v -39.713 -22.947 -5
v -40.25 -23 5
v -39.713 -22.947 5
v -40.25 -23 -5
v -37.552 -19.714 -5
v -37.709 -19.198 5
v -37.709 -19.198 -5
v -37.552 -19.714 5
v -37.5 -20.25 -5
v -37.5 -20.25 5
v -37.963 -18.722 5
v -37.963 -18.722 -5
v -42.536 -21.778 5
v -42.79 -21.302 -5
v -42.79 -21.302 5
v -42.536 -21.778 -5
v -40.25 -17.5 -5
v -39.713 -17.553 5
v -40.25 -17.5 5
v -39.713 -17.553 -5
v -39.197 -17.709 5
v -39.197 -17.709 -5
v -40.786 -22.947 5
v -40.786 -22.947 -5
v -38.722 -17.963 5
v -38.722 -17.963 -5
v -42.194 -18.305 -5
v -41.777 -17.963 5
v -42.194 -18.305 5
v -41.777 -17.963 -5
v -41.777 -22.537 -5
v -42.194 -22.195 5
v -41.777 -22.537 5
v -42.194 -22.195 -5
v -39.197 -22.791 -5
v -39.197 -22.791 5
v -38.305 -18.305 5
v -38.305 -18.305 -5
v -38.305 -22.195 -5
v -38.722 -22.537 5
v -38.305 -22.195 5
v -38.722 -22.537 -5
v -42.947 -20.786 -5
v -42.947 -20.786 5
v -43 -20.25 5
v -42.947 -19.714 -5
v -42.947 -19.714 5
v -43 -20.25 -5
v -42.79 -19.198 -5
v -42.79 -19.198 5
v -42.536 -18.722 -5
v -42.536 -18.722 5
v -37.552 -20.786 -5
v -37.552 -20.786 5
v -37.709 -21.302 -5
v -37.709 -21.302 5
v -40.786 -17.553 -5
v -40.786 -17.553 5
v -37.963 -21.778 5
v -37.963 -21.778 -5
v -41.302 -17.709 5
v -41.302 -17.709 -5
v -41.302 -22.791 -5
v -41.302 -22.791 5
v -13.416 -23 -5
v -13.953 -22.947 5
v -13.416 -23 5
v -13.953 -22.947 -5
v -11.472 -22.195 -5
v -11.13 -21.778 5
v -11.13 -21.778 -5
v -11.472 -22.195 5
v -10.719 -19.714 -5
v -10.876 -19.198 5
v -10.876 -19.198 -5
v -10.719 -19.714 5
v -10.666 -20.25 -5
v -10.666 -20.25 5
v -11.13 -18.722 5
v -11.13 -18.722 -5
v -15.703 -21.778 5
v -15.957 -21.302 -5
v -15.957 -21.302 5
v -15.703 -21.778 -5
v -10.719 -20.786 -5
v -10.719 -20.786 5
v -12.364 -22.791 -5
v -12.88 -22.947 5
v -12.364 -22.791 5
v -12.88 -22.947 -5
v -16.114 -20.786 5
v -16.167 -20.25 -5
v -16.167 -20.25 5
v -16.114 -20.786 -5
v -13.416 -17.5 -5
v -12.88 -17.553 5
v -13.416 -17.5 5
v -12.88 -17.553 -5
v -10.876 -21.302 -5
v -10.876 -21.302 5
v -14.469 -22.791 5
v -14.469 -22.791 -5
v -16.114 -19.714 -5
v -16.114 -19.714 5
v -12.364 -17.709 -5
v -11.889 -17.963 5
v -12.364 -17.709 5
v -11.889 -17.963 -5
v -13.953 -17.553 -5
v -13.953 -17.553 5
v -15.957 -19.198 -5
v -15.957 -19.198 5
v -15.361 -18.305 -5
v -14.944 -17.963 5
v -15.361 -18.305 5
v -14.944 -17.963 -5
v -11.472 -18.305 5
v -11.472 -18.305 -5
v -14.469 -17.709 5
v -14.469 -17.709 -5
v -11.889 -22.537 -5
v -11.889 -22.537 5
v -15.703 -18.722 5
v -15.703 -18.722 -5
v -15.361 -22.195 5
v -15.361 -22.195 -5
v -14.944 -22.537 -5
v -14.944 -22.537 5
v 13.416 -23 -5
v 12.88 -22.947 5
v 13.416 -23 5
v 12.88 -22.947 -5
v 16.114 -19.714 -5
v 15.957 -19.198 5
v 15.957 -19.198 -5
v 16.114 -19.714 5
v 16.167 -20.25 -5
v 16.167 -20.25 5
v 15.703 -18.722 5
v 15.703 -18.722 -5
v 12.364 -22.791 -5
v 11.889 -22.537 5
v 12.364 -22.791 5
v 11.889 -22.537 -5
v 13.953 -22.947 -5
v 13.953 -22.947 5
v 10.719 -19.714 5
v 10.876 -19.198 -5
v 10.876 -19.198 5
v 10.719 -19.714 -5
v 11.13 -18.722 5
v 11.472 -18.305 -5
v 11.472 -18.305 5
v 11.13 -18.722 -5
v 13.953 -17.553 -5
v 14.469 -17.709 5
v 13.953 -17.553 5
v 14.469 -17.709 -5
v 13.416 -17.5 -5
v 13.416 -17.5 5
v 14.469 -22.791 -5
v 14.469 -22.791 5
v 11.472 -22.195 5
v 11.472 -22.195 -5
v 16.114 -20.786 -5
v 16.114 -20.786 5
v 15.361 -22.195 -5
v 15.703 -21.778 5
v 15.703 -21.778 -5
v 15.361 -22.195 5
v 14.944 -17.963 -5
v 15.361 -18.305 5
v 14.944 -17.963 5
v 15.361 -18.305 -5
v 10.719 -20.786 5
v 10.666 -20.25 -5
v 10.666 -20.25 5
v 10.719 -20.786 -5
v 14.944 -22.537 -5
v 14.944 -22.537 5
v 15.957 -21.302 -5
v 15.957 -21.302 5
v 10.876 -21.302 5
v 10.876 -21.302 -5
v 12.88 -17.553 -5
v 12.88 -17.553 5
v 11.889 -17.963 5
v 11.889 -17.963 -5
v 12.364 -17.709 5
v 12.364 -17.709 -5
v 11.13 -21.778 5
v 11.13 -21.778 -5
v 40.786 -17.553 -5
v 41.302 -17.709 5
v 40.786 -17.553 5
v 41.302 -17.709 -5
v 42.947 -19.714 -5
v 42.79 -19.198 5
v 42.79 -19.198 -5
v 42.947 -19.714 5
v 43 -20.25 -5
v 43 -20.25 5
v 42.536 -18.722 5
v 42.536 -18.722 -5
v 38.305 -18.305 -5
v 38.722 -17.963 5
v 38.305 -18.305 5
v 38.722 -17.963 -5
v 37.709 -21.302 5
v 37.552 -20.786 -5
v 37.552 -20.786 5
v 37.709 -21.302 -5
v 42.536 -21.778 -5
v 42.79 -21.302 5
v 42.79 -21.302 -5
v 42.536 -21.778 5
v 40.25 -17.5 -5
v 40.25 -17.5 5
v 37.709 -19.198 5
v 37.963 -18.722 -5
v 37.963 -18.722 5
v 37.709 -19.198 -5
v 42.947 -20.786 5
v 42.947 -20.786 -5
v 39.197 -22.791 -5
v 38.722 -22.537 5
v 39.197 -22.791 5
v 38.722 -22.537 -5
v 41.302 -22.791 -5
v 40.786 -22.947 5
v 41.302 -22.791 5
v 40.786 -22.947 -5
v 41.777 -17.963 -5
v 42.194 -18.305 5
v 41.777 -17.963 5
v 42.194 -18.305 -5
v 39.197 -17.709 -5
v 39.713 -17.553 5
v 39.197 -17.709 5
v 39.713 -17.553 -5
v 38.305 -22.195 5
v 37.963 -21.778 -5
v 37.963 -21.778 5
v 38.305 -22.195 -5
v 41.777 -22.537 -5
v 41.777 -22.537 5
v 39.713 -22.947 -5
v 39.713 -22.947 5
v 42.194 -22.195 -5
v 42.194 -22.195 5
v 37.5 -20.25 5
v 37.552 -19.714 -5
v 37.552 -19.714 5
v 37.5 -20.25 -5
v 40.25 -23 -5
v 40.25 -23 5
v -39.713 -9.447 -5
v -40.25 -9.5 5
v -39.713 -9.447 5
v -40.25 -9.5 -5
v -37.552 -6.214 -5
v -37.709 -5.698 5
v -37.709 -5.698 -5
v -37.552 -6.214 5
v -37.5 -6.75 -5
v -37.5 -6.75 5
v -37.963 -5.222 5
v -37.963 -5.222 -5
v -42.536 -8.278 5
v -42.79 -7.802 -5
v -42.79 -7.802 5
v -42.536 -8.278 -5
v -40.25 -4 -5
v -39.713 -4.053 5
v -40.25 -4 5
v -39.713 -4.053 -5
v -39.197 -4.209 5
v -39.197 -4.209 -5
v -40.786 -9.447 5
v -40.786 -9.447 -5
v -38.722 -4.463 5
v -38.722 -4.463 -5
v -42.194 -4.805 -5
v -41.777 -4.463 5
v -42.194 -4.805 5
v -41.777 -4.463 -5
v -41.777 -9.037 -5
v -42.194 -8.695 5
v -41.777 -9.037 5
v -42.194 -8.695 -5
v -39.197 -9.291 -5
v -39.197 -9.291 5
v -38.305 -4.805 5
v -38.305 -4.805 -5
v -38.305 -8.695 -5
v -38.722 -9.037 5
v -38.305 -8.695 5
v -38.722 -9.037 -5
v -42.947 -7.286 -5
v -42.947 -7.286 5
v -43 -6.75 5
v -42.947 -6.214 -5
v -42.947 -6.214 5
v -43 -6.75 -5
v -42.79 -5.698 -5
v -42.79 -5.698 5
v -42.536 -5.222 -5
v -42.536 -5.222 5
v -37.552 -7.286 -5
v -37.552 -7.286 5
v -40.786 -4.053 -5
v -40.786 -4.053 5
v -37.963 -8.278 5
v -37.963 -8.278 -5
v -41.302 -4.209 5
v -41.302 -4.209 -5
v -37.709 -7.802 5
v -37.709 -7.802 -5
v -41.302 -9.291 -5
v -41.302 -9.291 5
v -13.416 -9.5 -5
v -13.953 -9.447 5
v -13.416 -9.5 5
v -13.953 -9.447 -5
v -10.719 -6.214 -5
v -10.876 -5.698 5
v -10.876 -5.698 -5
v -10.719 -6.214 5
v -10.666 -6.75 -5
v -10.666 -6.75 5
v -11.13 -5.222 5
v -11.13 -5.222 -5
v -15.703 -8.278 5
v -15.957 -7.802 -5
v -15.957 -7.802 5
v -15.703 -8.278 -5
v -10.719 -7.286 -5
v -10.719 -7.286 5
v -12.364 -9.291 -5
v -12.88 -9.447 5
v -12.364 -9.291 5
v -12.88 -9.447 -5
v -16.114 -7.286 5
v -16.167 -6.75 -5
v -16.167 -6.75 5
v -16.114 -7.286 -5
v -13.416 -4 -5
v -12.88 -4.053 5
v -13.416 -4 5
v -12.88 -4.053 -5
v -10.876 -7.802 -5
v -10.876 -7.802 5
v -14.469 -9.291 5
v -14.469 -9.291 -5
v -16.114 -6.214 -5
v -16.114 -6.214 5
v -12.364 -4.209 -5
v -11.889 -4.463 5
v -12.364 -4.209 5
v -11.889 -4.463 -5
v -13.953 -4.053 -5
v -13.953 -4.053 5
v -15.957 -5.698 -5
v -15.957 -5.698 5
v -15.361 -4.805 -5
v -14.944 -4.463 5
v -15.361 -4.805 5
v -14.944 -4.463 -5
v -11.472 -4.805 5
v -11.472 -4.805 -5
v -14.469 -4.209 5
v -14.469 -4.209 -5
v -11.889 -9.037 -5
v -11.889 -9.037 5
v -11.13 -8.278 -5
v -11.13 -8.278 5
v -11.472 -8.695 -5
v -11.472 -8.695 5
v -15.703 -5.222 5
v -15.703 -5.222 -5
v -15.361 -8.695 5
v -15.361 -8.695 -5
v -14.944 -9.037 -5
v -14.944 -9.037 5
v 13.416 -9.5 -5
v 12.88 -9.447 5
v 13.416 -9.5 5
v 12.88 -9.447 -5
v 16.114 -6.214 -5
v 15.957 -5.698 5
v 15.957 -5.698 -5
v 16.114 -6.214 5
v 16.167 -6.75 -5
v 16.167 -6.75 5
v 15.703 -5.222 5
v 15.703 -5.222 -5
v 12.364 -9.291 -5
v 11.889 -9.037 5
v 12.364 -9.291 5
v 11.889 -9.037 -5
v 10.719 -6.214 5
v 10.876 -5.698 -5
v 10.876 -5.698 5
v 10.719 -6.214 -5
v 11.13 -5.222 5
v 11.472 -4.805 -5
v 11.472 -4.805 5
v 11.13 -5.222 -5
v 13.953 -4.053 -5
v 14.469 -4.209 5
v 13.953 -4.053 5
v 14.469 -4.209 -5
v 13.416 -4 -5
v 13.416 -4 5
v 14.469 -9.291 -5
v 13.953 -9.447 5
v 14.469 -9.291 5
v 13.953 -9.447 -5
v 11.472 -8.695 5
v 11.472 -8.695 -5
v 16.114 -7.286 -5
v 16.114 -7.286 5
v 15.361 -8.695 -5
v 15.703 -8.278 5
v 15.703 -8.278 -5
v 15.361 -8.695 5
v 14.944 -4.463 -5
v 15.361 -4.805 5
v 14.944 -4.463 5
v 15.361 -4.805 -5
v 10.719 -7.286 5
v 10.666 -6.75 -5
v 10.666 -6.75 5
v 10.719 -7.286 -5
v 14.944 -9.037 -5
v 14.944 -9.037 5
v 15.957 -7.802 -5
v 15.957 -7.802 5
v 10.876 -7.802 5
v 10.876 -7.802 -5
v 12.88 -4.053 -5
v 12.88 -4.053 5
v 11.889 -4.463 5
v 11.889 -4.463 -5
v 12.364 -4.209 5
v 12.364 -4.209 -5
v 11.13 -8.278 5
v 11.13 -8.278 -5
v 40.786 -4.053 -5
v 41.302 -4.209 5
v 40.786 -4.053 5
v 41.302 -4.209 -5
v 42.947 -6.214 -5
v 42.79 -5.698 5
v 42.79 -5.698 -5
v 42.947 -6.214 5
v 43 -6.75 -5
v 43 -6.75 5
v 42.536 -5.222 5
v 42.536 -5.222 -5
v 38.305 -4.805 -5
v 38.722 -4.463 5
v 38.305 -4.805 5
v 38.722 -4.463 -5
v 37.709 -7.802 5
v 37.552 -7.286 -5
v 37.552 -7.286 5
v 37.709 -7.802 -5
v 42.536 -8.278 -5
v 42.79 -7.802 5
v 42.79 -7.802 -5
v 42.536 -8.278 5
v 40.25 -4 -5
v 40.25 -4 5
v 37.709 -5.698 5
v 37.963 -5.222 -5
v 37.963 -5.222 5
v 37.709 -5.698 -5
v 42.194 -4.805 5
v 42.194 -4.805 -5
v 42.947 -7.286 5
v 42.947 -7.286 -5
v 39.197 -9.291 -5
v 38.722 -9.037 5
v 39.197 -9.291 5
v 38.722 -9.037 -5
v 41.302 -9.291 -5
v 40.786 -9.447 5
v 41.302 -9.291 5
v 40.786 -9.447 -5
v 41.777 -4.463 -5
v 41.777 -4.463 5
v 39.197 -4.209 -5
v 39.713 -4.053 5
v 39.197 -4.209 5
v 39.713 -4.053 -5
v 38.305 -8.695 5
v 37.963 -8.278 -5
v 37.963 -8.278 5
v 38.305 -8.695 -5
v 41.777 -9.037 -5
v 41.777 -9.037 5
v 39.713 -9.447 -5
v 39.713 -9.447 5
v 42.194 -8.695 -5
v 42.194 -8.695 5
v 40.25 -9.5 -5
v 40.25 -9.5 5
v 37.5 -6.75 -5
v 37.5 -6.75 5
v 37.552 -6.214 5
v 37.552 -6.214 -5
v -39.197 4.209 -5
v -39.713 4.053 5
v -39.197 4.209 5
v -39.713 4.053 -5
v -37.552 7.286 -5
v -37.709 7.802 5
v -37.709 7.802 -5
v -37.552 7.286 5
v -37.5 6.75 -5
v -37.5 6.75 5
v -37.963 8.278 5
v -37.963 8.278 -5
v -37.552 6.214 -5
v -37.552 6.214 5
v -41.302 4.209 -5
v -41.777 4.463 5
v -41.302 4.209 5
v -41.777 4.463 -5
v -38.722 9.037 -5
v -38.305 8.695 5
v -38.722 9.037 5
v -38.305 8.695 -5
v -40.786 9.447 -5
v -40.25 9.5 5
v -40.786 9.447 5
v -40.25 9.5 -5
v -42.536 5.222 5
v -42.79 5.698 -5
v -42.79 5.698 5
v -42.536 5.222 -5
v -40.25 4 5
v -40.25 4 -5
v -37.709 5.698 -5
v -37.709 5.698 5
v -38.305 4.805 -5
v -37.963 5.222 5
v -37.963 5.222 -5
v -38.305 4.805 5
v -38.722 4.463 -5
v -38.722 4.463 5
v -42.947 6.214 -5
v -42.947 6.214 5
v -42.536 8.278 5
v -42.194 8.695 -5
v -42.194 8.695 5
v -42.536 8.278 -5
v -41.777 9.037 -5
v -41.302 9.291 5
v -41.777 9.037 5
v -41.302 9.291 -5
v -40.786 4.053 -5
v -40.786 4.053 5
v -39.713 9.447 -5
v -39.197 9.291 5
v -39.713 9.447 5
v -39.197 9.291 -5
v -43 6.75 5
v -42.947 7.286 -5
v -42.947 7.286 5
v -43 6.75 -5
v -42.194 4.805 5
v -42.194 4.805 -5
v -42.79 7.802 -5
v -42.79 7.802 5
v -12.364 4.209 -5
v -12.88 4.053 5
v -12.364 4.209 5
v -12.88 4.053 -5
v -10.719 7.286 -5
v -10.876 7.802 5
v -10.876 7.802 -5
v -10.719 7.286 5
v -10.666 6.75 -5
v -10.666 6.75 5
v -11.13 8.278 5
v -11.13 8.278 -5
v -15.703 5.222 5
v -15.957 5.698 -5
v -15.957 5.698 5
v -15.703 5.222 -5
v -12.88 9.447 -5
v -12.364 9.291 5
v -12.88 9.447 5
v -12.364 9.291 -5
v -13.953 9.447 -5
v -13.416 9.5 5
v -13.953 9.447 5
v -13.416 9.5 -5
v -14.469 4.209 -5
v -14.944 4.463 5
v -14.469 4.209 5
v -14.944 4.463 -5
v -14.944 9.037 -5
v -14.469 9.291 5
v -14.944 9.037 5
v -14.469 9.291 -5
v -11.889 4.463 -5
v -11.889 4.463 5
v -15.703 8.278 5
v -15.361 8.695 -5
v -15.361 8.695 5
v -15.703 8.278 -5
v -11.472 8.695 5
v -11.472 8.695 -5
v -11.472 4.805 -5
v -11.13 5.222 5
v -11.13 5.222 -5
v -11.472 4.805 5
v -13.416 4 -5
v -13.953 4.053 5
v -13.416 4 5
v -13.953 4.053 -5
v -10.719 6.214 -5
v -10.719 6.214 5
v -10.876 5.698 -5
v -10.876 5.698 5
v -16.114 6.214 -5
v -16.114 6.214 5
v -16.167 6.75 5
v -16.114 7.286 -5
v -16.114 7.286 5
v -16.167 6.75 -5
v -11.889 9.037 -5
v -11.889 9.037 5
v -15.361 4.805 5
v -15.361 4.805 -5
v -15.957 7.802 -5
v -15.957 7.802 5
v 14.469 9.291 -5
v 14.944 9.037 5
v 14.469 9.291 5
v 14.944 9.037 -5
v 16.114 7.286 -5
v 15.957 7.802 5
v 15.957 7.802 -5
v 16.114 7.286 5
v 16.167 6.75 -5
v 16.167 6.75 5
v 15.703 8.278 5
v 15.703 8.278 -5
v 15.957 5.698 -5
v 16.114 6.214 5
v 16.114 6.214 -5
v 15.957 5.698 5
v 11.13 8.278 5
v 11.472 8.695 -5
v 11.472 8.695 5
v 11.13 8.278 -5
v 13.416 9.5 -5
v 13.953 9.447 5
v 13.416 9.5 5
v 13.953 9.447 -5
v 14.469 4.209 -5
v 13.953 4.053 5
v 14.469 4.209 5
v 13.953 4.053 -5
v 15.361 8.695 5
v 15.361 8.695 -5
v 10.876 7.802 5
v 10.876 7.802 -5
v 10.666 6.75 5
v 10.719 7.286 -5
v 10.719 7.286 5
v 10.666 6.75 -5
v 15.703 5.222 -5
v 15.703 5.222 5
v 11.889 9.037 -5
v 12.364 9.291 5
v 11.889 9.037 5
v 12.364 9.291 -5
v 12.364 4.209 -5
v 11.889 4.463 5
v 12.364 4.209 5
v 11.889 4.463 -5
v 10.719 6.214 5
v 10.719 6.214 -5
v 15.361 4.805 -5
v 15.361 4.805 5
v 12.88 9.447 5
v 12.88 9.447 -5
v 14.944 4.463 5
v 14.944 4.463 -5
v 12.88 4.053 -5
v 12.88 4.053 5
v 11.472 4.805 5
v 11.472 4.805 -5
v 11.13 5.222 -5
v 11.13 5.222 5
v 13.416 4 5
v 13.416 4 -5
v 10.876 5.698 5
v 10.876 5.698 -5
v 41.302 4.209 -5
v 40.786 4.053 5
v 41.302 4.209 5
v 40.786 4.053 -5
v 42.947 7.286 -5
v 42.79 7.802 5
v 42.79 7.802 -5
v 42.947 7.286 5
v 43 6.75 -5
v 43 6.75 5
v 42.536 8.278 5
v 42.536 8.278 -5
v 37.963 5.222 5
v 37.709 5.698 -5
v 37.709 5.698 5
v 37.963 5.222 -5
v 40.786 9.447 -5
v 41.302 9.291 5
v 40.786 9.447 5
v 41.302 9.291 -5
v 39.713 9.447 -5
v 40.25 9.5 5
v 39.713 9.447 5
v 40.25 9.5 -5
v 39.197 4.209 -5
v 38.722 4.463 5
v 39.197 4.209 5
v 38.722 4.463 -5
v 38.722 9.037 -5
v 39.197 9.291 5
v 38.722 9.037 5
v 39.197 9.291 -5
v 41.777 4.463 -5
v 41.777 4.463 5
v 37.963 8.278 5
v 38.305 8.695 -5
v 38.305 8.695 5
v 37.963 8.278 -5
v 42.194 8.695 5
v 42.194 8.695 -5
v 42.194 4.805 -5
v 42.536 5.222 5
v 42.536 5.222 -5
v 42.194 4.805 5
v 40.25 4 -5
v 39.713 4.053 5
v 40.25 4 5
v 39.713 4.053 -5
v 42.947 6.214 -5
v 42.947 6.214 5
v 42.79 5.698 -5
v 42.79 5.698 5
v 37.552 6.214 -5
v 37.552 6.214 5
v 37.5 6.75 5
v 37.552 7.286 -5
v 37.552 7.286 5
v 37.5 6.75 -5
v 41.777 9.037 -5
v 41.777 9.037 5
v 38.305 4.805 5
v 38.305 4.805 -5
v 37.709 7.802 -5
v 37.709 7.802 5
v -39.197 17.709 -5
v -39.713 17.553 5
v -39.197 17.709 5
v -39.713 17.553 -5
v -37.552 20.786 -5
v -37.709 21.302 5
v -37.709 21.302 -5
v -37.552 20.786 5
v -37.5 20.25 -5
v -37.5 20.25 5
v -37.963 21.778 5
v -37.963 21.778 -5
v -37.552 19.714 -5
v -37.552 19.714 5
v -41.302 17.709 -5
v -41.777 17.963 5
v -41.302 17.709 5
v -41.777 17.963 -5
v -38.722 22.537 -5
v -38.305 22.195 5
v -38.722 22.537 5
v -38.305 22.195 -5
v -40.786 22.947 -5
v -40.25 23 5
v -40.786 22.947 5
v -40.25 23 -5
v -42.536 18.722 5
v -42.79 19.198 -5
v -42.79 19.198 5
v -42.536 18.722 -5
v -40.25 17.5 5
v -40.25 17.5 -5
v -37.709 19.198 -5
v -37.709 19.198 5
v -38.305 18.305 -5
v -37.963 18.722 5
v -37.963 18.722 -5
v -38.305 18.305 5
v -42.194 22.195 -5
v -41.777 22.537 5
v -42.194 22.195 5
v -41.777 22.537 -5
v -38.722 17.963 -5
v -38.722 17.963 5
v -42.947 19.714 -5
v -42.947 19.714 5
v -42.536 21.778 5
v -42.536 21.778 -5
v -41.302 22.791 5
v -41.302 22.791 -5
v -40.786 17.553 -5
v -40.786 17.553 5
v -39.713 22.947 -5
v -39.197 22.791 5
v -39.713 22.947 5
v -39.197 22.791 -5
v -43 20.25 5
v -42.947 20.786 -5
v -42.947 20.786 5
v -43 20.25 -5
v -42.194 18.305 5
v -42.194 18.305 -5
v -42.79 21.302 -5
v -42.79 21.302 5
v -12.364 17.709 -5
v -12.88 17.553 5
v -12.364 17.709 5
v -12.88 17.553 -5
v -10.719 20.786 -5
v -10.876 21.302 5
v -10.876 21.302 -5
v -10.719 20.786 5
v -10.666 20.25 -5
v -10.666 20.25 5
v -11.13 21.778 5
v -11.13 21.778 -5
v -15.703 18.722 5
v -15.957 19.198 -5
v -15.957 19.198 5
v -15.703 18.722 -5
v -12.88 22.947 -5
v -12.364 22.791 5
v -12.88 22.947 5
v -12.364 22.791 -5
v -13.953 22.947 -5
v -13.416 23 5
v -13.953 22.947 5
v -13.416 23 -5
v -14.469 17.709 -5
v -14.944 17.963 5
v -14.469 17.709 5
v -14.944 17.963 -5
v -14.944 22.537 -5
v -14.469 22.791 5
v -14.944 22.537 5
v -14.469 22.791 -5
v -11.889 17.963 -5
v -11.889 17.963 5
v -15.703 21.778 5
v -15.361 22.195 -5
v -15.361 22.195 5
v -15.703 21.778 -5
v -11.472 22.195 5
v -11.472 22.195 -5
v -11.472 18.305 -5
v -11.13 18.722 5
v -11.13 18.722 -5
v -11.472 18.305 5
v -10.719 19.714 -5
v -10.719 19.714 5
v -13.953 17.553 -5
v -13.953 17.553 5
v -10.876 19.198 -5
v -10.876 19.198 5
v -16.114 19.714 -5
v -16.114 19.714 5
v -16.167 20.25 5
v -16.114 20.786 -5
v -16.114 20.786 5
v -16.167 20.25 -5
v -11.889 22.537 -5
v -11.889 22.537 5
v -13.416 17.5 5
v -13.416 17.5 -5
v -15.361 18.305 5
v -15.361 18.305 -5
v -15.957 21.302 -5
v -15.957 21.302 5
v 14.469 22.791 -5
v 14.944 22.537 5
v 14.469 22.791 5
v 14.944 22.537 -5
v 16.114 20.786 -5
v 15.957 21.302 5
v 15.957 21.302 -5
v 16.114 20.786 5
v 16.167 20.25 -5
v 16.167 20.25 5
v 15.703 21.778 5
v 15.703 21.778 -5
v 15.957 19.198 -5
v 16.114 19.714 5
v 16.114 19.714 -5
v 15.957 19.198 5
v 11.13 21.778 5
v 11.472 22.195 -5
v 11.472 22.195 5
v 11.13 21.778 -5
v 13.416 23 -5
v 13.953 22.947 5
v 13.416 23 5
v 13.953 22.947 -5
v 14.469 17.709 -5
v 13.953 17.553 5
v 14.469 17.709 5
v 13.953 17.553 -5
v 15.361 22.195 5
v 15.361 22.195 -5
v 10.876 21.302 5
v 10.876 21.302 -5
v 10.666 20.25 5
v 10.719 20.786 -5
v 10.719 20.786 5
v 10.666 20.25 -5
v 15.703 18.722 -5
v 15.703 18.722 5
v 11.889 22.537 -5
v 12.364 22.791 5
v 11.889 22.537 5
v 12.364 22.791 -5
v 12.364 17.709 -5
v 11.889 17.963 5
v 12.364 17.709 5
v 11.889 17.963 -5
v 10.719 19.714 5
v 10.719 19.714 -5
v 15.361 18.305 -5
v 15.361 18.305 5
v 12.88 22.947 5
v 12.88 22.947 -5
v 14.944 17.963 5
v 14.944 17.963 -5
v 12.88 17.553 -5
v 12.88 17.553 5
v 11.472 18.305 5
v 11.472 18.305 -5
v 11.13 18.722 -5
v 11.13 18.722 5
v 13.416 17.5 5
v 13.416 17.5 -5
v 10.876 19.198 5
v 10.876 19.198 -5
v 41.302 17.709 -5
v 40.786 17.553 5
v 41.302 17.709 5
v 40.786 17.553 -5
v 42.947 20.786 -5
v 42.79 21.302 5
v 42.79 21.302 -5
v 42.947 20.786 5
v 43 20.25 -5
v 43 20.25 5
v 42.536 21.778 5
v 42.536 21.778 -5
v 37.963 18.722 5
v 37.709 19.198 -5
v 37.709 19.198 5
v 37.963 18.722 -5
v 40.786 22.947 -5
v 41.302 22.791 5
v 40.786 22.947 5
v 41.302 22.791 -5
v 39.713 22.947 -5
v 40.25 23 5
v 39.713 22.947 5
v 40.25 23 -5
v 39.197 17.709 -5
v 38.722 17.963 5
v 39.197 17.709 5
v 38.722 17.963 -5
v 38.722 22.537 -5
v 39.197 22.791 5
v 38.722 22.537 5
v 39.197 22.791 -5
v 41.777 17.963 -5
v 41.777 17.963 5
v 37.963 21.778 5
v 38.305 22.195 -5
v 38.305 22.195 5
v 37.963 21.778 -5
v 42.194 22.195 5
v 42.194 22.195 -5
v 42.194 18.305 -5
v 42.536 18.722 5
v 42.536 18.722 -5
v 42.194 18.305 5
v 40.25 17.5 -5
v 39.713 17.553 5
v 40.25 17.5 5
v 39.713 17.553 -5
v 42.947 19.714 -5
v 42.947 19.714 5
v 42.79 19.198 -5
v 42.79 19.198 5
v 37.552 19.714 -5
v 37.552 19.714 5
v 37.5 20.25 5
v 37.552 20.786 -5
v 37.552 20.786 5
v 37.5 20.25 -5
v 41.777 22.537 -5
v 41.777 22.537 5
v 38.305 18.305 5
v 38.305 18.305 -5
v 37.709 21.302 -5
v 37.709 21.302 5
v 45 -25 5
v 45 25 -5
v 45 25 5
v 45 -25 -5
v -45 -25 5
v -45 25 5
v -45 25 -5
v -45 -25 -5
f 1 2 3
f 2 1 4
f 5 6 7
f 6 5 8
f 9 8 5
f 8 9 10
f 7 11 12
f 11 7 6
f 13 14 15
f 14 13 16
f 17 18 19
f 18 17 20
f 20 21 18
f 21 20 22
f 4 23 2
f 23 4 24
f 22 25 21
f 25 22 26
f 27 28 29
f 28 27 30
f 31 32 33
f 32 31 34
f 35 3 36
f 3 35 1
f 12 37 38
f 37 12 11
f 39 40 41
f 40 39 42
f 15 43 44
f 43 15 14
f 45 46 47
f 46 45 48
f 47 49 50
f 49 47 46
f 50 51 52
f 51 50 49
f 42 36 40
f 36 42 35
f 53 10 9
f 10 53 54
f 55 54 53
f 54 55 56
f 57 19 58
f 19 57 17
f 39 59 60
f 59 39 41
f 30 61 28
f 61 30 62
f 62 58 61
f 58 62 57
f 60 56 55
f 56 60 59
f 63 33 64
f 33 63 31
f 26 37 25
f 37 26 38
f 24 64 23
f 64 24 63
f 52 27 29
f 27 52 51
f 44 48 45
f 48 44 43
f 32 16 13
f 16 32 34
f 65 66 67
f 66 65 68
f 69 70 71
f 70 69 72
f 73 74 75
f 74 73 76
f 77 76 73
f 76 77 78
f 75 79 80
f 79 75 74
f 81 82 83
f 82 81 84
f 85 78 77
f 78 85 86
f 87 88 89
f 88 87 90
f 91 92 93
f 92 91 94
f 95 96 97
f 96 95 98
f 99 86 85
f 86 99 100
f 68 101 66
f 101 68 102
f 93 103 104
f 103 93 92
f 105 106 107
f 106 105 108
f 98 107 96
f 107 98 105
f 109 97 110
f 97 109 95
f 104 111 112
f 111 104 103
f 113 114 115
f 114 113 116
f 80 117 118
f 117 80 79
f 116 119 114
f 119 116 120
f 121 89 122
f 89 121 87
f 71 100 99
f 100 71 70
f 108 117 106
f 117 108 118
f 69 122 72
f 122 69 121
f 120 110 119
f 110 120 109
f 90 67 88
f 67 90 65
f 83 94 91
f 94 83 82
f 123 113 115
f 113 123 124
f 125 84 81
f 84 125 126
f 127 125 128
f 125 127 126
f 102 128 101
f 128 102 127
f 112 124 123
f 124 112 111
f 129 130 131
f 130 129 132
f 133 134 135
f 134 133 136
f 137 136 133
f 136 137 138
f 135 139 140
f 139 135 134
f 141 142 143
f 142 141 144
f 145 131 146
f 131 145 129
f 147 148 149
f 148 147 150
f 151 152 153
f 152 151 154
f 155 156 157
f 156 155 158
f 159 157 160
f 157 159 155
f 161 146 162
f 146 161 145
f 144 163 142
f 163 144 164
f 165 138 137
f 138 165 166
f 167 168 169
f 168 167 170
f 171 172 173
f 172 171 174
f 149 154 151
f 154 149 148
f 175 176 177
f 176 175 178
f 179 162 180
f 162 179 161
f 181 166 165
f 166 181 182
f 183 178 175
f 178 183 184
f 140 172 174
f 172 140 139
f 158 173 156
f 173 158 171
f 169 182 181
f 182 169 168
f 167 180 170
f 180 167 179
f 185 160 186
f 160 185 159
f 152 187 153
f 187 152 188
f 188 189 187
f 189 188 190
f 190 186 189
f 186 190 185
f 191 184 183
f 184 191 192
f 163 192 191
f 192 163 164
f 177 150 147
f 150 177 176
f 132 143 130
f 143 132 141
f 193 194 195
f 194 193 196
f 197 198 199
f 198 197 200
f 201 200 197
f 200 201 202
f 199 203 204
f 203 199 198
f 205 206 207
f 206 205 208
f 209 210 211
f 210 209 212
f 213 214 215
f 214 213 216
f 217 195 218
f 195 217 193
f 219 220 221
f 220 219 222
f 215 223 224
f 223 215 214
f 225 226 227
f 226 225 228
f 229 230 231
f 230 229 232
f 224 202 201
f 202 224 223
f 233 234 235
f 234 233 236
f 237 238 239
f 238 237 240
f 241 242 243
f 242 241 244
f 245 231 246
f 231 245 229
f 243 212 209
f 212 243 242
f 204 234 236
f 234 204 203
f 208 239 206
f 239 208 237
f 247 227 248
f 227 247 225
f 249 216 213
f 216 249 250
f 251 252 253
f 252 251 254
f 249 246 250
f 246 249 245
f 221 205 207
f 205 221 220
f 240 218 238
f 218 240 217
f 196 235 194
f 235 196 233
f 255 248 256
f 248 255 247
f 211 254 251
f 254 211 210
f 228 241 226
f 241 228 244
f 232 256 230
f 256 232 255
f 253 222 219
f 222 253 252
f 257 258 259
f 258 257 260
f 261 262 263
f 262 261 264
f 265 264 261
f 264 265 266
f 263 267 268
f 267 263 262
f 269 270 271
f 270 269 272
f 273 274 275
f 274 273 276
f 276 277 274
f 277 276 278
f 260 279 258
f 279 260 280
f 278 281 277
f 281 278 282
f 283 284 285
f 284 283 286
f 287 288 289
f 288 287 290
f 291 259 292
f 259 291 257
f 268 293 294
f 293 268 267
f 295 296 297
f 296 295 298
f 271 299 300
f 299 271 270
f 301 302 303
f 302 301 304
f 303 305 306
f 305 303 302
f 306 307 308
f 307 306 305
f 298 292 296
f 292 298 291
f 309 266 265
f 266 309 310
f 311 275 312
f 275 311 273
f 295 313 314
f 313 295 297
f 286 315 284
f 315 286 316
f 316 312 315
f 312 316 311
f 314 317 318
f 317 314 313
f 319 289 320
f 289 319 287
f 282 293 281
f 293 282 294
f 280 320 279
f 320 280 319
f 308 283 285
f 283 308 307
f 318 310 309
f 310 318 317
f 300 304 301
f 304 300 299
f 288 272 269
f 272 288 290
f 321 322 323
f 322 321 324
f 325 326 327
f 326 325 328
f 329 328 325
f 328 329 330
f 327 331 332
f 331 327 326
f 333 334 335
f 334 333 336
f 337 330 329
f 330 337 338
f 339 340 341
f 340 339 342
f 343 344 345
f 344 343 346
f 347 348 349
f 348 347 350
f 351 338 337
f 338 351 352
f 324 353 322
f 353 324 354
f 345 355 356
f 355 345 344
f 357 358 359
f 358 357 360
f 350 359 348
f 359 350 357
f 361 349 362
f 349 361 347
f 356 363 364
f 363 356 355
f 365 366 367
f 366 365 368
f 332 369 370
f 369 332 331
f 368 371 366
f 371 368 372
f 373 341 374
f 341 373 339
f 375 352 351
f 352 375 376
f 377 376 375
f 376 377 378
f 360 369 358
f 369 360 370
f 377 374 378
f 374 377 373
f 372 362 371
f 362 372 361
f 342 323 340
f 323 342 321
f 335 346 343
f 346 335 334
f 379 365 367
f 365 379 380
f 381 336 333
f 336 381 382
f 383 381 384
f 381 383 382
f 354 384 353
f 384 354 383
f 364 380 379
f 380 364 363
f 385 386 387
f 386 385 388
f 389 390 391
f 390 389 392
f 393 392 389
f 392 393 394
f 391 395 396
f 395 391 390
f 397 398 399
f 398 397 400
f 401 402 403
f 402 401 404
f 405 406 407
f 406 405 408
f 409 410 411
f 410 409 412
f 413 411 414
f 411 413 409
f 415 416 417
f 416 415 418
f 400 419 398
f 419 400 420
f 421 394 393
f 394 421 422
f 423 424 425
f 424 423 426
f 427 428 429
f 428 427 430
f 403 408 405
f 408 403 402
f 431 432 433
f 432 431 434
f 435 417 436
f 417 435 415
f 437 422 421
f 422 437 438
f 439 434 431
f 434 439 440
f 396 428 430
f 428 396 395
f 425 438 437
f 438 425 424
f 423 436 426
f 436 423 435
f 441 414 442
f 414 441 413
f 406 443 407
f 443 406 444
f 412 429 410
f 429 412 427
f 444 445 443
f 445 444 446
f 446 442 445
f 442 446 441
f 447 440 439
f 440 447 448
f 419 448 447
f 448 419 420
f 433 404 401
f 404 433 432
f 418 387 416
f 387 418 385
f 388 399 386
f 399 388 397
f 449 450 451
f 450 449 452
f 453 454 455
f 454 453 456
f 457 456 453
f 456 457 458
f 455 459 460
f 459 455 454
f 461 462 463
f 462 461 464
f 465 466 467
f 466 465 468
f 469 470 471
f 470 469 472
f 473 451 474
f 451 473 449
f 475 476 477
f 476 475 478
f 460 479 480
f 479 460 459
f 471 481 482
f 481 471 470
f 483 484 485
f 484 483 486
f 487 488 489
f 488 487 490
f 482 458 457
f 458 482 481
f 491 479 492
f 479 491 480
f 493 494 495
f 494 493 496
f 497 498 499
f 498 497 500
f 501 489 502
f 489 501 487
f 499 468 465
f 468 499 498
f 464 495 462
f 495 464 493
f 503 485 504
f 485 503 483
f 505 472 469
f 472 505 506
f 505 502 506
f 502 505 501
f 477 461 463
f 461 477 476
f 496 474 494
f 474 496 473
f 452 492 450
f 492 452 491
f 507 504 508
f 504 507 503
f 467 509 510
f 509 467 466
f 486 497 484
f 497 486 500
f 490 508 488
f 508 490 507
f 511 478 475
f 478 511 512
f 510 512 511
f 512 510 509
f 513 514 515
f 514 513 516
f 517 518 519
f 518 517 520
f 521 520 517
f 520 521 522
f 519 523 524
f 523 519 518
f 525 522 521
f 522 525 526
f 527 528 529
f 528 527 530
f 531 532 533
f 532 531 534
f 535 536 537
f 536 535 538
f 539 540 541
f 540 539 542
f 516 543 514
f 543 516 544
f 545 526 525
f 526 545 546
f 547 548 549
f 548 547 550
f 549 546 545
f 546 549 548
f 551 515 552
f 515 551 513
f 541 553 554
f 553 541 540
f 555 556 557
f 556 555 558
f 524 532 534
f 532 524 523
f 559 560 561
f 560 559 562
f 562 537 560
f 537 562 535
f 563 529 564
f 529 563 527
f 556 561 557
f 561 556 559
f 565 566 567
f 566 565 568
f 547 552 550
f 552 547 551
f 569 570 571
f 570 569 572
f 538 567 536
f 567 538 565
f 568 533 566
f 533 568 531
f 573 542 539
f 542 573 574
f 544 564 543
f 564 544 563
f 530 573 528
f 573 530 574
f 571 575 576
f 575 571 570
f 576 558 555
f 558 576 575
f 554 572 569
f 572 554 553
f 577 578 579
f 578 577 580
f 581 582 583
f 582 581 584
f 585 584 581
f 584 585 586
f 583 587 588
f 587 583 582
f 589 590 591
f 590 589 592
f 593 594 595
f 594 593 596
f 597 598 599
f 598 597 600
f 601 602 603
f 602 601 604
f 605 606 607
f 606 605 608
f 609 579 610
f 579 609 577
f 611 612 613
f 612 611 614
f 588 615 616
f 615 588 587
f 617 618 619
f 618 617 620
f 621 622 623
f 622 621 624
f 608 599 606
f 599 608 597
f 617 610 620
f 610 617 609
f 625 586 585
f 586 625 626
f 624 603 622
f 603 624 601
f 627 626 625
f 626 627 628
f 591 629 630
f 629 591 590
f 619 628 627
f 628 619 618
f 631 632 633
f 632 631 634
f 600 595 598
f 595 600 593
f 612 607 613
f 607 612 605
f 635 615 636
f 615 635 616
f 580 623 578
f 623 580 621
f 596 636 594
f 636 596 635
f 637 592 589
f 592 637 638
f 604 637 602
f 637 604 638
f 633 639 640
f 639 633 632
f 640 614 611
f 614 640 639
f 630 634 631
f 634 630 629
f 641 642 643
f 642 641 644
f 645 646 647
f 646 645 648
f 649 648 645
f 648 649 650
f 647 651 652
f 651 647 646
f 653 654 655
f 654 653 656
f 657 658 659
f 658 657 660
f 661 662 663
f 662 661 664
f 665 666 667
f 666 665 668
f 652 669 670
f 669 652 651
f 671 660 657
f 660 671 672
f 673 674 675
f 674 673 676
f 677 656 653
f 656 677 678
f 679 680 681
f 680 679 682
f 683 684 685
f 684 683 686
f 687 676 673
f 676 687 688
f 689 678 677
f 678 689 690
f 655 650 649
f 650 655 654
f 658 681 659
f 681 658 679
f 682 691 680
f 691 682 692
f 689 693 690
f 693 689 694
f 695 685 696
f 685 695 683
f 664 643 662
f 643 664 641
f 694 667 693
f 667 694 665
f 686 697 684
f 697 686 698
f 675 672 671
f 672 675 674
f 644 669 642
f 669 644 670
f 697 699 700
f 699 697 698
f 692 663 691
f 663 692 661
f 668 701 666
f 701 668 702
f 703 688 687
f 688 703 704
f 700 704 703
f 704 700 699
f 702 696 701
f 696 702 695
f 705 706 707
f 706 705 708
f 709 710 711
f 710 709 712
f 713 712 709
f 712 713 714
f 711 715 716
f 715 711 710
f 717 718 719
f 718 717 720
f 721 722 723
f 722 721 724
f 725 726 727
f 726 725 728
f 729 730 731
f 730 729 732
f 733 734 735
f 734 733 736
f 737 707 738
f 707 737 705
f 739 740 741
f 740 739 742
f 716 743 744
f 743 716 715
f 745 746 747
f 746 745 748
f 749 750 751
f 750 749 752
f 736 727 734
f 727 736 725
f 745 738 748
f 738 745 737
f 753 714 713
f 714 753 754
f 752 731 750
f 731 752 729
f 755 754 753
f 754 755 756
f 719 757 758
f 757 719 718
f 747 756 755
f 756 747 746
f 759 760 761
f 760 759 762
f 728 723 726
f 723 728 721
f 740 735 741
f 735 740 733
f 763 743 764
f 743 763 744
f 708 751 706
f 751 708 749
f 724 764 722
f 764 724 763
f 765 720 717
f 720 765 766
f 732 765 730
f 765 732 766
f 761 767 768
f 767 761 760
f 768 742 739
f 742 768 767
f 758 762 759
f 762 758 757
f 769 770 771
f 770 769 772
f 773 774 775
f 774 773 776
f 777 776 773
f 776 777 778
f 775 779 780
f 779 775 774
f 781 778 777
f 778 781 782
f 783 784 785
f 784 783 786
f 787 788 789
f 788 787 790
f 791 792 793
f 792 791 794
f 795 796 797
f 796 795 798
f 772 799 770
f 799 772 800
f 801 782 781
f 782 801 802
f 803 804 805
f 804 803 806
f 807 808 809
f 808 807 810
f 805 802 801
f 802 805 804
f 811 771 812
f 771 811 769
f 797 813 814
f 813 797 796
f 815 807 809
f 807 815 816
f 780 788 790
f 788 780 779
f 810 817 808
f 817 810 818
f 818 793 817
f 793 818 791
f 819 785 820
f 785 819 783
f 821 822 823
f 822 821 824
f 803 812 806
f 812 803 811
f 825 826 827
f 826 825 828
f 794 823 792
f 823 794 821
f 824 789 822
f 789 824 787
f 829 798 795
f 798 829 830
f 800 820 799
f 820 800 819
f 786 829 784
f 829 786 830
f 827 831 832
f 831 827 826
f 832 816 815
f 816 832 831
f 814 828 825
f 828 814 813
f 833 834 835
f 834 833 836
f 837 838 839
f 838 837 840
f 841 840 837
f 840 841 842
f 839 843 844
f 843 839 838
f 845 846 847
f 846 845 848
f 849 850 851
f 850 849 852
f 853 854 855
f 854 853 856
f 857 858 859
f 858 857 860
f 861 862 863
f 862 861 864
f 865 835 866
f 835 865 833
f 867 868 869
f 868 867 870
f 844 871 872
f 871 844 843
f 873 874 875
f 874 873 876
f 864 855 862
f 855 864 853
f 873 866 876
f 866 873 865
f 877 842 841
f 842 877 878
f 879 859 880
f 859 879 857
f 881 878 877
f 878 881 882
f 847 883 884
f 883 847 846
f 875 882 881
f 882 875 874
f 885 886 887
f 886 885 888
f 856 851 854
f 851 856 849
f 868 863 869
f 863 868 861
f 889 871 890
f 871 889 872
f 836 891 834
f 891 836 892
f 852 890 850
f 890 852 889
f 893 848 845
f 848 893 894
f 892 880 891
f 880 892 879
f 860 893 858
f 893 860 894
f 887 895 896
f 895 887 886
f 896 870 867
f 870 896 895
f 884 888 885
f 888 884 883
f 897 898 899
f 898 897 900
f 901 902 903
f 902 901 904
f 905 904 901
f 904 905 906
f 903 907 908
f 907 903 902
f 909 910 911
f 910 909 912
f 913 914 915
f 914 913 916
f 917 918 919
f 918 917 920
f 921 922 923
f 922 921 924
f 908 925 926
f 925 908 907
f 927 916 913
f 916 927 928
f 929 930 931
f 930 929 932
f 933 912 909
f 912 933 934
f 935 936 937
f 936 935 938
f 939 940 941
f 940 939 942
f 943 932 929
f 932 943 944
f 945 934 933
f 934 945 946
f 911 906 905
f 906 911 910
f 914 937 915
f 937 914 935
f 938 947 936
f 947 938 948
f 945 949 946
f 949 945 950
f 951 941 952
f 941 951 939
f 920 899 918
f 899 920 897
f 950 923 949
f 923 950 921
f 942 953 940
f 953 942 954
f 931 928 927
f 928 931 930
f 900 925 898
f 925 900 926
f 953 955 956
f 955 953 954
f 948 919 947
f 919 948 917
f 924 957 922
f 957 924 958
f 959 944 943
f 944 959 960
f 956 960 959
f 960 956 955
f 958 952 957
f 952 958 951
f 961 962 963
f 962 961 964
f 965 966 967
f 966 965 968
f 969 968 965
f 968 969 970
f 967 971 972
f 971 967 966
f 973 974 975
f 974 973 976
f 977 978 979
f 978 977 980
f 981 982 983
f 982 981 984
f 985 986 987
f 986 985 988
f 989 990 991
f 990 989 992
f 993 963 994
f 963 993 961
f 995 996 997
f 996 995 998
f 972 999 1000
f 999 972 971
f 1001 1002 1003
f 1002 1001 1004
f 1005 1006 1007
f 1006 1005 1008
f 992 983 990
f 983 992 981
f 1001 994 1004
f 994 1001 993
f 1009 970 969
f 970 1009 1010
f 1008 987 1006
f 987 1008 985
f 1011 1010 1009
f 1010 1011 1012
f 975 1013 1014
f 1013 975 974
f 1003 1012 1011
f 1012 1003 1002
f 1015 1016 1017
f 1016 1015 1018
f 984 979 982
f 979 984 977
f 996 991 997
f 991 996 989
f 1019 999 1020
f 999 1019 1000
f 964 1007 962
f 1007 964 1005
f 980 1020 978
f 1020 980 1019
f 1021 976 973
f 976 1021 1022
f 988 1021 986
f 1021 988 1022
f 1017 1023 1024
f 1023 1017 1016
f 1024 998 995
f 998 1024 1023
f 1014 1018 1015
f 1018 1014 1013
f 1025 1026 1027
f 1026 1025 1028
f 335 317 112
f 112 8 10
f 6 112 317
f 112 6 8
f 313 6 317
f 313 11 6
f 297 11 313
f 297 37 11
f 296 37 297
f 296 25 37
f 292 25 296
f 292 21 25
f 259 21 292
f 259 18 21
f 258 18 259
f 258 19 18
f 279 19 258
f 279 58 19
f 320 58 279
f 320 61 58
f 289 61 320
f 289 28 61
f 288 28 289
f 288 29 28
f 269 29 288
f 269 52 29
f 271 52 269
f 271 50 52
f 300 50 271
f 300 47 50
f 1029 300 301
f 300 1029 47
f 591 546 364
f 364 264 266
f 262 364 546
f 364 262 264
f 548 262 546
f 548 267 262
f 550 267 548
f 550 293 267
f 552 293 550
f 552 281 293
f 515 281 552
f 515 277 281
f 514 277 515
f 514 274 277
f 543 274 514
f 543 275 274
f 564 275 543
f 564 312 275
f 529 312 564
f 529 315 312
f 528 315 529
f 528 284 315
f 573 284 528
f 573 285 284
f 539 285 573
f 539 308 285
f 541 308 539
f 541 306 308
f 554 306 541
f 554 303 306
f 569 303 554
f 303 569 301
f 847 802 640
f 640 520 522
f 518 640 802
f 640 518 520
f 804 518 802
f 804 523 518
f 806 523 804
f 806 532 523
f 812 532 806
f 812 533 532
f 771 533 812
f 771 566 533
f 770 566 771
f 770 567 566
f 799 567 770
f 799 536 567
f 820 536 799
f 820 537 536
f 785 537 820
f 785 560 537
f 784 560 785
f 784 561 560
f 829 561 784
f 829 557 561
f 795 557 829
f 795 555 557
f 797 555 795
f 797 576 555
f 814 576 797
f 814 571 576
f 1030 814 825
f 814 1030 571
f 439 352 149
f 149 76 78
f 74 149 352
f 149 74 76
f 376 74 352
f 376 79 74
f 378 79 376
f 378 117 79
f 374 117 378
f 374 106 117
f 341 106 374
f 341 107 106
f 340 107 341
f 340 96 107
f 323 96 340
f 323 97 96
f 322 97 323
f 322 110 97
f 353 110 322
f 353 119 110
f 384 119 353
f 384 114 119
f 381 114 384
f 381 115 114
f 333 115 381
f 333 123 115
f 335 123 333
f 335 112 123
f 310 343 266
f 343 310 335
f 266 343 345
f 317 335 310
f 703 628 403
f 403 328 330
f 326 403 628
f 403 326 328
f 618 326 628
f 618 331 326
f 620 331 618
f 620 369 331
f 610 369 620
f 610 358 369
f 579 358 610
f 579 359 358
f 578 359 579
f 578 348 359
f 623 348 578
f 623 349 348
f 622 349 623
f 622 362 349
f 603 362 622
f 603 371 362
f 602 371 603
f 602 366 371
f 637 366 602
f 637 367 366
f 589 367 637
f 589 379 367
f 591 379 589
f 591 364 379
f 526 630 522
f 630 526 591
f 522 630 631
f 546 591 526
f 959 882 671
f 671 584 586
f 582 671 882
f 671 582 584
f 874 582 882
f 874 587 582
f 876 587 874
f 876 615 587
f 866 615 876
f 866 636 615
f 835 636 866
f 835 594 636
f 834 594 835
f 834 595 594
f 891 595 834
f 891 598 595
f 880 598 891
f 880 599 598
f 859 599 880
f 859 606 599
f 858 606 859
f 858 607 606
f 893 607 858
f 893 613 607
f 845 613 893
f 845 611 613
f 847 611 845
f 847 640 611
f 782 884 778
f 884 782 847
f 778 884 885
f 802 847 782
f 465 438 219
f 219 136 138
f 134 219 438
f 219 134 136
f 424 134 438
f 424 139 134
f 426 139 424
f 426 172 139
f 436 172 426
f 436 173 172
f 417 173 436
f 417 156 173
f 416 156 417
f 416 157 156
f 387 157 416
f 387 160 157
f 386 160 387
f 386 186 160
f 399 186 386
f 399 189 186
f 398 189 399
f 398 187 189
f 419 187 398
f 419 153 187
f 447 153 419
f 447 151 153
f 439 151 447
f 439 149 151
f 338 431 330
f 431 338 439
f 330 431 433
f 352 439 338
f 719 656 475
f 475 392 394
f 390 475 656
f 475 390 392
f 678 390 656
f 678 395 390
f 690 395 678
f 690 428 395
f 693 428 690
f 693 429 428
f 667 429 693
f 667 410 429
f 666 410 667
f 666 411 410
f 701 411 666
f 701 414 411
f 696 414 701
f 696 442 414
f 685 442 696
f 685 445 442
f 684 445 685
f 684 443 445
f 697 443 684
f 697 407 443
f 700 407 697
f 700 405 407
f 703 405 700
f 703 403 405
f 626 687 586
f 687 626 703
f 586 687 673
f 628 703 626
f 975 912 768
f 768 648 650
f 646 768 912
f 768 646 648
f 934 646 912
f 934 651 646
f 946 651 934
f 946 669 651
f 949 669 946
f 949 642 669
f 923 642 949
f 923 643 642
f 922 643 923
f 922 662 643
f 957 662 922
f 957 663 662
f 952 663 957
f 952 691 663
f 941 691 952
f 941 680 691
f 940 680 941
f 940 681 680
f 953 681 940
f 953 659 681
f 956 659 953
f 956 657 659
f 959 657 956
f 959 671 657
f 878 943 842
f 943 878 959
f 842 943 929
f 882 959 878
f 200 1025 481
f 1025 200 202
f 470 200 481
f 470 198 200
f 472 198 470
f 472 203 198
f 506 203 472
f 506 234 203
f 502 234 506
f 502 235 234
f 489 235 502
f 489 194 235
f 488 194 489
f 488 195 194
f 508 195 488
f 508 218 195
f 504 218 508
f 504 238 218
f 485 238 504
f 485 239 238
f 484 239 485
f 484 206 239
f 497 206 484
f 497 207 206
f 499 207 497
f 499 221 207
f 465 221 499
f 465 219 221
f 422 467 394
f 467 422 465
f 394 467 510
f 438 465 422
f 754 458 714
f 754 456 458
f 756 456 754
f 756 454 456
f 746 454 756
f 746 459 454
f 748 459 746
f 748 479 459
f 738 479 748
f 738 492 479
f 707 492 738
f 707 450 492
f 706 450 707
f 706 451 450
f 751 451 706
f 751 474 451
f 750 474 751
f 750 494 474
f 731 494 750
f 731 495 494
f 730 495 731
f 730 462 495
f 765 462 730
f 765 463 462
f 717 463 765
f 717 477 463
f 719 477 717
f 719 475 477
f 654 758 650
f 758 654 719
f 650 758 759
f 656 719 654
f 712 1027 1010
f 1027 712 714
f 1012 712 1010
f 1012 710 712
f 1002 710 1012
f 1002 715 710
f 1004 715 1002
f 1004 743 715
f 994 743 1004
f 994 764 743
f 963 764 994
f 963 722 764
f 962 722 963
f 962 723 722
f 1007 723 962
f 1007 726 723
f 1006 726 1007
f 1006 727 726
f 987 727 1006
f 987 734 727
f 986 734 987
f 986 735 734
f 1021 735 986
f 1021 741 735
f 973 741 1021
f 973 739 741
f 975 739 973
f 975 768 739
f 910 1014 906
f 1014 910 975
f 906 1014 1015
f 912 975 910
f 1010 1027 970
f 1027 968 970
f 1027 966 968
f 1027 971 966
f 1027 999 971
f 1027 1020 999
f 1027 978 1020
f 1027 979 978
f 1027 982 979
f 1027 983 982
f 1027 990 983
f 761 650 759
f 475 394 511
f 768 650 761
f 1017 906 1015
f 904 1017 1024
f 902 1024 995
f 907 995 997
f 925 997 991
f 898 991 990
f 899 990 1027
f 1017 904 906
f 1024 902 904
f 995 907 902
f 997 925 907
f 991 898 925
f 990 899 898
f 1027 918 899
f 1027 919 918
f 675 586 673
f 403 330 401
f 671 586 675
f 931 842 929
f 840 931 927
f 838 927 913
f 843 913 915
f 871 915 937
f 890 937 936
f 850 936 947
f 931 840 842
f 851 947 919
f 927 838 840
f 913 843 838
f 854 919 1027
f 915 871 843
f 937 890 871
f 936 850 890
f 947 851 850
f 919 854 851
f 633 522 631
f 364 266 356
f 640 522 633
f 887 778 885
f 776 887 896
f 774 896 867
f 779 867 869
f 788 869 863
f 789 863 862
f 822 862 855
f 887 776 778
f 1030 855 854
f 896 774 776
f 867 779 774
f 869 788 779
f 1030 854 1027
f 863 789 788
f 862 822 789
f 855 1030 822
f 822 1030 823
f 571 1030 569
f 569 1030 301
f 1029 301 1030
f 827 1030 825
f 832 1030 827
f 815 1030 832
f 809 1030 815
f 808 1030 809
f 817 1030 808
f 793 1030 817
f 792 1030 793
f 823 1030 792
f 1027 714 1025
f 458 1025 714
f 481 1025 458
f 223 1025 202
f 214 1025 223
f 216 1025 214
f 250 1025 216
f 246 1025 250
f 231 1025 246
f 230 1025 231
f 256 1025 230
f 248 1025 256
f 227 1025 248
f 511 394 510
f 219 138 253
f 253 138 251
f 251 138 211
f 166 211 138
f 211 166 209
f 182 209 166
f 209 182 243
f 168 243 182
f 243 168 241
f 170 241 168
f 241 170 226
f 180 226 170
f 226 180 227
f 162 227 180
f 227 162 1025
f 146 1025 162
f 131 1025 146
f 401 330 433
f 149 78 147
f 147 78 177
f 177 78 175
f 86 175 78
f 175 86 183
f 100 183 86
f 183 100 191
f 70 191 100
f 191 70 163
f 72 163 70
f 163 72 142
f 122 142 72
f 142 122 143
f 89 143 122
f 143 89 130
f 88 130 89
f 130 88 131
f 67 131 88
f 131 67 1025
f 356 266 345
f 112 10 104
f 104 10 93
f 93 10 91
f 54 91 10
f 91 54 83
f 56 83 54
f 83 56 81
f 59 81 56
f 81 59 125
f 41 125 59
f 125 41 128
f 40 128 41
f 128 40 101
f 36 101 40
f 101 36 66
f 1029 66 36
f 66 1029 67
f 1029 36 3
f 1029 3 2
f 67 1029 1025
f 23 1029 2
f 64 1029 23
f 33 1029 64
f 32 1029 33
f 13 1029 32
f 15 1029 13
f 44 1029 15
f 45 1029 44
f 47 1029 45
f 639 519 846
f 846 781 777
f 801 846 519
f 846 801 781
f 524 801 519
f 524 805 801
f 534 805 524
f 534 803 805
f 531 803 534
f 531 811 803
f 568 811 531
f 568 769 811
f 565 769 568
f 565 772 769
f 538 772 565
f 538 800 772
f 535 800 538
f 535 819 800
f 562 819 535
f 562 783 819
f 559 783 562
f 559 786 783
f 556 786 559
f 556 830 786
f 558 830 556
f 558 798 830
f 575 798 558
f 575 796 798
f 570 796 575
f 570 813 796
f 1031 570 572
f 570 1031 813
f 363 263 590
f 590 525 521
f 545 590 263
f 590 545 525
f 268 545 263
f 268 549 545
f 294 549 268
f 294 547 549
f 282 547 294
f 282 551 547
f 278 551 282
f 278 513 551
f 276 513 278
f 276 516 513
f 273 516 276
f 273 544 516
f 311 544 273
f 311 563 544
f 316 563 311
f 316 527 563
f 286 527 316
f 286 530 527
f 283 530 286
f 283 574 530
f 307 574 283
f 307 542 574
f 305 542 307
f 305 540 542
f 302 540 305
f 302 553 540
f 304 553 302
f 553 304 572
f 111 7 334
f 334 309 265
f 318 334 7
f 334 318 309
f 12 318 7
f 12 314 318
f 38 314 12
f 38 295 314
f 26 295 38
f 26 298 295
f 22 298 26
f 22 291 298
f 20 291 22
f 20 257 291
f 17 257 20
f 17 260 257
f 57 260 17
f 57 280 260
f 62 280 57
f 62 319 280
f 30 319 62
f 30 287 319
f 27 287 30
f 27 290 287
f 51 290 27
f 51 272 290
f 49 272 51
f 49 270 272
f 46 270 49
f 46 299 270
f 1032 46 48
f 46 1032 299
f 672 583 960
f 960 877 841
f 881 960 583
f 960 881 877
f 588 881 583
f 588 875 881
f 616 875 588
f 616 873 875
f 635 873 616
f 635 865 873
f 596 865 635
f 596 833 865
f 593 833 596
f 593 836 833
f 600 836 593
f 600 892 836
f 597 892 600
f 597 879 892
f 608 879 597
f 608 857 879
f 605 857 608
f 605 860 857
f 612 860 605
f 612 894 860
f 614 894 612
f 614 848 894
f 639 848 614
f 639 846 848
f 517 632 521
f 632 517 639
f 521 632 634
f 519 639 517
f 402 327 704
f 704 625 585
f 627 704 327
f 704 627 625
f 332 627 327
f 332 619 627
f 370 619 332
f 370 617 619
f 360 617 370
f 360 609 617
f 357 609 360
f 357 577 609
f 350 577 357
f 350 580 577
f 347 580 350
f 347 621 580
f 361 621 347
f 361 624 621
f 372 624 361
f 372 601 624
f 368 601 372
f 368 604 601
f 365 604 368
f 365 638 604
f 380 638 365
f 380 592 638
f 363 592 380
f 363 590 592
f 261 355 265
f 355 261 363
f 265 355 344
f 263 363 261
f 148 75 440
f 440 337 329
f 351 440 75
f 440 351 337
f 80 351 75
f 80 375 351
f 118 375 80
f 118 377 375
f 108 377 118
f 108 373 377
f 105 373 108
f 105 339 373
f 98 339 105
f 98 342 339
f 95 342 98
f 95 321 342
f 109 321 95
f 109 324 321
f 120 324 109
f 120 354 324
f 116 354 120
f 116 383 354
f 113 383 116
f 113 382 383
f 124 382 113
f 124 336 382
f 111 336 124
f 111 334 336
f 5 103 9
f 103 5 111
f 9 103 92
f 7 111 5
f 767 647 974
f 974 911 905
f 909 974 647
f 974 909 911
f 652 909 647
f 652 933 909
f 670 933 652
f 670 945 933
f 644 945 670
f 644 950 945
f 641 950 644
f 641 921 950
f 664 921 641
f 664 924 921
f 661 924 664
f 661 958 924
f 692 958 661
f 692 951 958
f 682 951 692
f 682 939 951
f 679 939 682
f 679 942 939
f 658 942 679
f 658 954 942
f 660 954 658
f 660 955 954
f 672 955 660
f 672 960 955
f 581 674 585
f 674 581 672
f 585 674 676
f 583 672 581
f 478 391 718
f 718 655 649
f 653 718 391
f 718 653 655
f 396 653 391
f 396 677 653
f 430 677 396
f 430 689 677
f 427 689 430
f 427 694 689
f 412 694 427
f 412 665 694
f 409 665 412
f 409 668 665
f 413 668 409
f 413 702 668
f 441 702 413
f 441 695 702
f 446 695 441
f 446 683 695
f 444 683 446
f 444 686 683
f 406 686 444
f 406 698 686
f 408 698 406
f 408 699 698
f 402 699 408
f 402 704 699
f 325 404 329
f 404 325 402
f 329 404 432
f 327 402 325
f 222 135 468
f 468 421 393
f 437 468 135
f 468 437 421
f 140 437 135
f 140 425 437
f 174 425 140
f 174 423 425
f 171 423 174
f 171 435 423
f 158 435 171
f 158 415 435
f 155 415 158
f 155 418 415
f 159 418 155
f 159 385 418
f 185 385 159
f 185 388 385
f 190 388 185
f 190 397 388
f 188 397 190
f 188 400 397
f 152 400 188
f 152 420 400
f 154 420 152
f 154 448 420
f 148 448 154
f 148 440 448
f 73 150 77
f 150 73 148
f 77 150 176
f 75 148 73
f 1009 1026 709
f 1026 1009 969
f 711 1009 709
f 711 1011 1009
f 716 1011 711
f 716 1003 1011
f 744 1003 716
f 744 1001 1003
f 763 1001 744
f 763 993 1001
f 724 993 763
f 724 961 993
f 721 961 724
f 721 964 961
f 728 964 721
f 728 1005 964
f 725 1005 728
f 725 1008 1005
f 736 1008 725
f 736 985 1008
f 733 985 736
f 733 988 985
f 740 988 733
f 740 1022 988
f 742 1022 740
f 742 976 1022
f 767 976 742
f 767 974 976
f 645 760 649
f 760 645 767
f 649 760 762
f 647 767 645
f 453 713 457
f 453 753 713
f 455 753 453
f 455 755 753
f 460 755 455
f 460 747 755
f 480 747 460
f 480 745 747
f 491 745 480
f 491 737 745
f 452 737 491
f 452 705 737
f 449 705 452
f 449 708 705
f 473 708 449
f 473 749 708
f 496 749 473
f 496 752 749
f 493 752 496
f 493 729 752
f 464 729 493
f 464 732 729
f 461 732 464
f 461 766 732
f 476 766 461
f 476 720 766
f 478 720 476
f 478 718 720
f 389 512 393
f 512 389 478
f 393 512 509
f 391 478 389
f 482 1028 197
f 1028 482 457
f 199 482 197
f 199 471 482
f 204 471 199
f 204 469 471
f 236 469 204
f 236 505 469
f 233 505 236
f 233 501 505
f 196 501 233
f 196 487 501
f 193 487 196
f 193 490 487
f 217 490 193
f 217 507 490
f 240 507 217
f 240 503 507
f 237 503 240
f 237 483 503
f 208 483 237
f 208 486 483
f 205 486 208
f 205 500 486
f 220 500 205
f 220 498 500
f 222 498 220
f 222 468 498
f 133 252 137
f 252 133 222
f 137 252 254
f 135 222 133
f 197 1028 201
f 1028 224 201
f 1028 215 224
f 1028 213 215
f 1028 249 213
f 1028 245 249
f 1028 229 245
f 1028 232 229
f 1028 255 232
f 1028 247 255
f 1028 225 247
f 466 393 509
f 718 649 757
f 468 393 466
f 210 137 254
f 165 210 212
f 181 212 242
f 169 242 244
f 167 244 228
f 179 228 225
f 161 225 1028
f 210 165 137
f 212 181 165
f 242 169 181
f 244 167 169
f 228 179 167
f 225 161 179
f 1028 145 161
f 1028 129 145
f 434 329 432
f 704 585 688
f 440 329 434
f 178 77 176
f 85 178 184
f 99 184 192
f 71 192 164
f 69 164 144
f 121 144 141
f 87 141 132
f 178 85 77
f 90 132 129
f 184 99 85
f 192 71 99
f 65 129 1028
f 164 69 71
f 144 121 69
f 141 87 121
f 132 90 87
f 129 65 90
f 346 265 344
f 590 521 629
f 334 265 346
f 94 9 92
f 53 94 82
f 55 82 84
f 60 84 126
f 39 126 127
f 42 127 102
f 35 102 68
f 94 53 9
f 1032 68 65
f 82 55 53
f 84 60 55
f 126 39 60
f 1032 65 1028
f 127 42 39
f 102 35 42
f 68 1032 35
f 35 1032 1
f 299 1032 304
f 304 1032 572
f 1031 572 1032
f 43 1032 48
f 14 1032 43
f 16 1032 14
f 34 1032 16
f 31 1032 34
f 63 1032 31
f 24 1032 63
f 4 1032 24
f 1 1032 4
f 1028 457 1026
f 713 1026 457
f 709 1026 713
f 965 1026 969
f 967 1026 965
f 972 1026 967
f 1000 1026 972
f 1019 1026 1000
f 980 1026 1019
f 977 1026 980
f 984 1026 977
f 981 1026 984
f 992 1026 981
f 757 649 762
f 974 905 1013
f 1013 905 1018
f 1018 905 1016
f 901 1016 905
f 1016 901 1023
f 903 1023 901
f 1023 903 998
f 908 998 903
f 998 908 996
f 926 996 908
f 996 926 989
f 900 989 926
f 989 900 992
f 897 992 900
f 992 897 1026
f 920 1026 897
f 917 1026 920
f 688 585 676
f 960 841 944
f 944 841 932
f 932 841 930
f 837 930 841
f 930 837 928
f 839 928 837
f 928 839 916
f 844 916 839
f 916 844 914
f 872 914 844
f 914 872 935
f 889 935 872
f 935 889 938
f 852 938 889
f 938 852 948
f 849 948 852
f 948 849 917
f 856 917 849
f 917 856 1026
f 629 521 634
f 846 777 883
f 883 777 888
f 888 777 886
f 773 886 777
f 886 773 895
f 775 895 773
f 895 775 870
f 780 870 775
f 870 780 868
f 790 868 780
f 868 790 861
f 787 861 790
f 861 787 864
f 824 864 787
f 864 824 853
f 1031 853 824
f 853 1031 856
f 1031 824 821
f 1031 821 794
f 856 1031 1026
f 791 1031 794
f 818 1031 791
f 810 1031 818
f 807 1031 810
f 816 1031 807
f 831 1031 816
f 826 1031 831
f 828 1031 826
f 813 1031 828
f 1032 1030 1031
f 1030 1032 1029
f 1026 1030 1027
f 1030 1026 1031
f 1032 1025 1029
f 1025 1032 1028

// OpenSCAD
$fn = 32;

// ----------------------------------------------------------------------
// Perforated panel 90 x 50 x 10
// 4 x 4 Ø5.5 holes, grid layout
// ----------------------------------------------------------------------

// --- parameters (mm) ---
panel = [90, 50, 10];  // overall size (x, y, z)
hole_d = 5.5;          // hole diameter
pitch_x = 26.833;      // hole pitch along X
pitch_y = 13.5;        // hole pitch along Y

// --- derived feature positions (mm) ---
margin = hole_d / 2 + 2;            // = 4.75   clearance from the panel edge
cols = floor((panel[0] - 2 * margin) / pitch_x) + 1;  // = 4   how many columns fit in X
rows = floor((panel[1] - 2 * margin) / pitch_y) + 1;  // = 4   how many rows fit in Y
span_x = (cols - 1) * pitch_x + 0;  // = 80.5   width of the field
span_y = (rows - 1) * pitch_y;      // = 40.5   height of the field
origin_x = -span_x / 2;             // = -40.25   X of the first hole
origin_y = -span_y / 2;             // = -20.25   Y of the first row
holes = rows * cols;                // = 16   holes in total
feature_centers = [
  [origin_x + 0 * pitch_x, origin_y + 0 * pitch_y],
  [origin_x + 1 * pitch_x, origin_y + 0 * pitch_y],
  [origin_x + 2 * pitch_x, origin_y + 0 * pitch_y],
  [origin_x + 3 * pitch_x, origin_y + 0 * pitch_y],
  [origin_x + 0 * pitch_x, origin_y + 1 * pitch_y],
  [origin_x + 1 * pitch_x, origin_y + 1 * pitch_y],
  [origin_x + 2 * pitch_x, origin_y + 1 * pitch_y],
  [origin_x + 3 * pitch_x, origin_y + 1 * pitch_y],
  [origin_x + 0 * pitch_x, origin_y + 2 * pitch_y],
  [origin_x + 1 * pitch_x, origin_y + 2 * pitch_y],
  [origin_x + 2 * pitch_x, origin_y + 2 * pitch_y],
  [origin_x + 3 * pitch_x, origin_y + 2 * pitch_y],
  [origin_x + 0 * pitch_x, origin_y + 3 * pitch_y],
  [origin_x + 1 * pitch_x, origin_y + 3 * pitch_y],
  [origin_x + 2 * pitch_x, origin_y + 3 * pitch_y],
  [origin_x + 3 * pitch_x, origin_y + 3 * pitch_y]
];   // hole centres, used verbatim by the cutter loop

// panel outline, every hole through
difference() {
  cube(panel, center = true);
  for (centre = feature_centers)
    translate([centre[0], centre[1], 0])
      cylinder(d = hole_d, h = panel[2] + 2, center = true);
}
